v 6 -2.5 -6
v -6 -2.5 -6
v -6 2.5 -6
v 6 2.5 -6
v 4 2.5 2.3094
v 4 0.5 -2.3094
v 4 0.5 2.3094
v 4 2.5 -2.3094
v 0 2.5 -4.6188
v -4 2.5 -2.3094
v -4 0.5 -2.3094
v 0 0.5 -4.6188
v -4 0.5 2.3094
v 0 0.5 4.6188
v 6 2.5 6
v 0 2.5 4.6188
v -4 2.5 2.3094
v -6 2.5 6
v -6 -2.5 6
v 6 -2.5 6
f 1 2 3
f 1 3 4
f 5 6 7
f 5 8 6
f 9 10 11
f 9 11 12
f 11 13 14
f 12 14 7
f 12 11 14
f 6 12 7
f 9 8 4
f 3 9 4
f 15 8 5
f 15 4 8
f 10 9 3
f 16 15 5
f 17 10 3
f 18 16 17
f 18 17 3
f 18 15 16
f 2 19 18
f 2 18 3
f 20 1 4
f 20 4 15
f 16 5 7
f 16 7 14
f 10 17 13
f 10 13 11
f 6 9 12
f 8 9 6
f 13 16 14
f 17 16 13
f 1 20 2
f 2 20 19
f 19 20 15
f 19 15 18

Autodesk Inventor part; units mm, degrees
ref_plane "YZ Plane" through (0, 0, 0) normal (1, 0, 0) x (0, 1, 0)
ref_plane "XZ Plane" through (0, 0, 0) normal (0, 1, 0) x (-1, 0, 0)
ref_plane "XY Plane" through (0, 0, 0) normal (0, 0, 1) x (1, 0, 0)
sketch "Sketch1" plane through (0, 0, 0) normal (0, 1, 0) x (-1, 0, 0)
  line L0 (-6, 6) -> (6, 6)
  line L1 (6, 6) -> (6, -6)
  line L2 (6, -6) -> (-6, -6)
  line L3 (-6, -6) -> (-6, 6)
  line L4 (-6, 6) -> (6, -6) construction
  line L5 (6, 6) -> (-6, -6) construction
  point P0 (0, 0)
  dimension "d0" = 12
  dimension "d1" = 12
extrude "Extrusion1" add sketch "Sketch1" along normal mid plane 5
sketch "Sketch2" plane through (0, 2.5, 0) normal (0, 1, 0) x (1, 0, 0)
  line L0 (-4, 2.3094) -> (0, 4.6188)
  line L1 (0, 4.6188) -> (4, 2.3094)
  line L2 (4, 2.3094) -> (4, -2.3094)
  line L3 (4, -2.3094) -> (0, -4.6188)
  line L4 (0, -4.6188) -> (-4, -2.3094)
  line L5 (-4, -2.3094) -> (-4, 2.3094)
  point P0 (0, 0)
  point P1 (0, 0)
  dimension "d8" = 8
extrude "Extrusion2" cut sketch "Sketch2" against normal blind 2
equation "\"d1\" = d0"
properties part number "PressFItTestHole"
